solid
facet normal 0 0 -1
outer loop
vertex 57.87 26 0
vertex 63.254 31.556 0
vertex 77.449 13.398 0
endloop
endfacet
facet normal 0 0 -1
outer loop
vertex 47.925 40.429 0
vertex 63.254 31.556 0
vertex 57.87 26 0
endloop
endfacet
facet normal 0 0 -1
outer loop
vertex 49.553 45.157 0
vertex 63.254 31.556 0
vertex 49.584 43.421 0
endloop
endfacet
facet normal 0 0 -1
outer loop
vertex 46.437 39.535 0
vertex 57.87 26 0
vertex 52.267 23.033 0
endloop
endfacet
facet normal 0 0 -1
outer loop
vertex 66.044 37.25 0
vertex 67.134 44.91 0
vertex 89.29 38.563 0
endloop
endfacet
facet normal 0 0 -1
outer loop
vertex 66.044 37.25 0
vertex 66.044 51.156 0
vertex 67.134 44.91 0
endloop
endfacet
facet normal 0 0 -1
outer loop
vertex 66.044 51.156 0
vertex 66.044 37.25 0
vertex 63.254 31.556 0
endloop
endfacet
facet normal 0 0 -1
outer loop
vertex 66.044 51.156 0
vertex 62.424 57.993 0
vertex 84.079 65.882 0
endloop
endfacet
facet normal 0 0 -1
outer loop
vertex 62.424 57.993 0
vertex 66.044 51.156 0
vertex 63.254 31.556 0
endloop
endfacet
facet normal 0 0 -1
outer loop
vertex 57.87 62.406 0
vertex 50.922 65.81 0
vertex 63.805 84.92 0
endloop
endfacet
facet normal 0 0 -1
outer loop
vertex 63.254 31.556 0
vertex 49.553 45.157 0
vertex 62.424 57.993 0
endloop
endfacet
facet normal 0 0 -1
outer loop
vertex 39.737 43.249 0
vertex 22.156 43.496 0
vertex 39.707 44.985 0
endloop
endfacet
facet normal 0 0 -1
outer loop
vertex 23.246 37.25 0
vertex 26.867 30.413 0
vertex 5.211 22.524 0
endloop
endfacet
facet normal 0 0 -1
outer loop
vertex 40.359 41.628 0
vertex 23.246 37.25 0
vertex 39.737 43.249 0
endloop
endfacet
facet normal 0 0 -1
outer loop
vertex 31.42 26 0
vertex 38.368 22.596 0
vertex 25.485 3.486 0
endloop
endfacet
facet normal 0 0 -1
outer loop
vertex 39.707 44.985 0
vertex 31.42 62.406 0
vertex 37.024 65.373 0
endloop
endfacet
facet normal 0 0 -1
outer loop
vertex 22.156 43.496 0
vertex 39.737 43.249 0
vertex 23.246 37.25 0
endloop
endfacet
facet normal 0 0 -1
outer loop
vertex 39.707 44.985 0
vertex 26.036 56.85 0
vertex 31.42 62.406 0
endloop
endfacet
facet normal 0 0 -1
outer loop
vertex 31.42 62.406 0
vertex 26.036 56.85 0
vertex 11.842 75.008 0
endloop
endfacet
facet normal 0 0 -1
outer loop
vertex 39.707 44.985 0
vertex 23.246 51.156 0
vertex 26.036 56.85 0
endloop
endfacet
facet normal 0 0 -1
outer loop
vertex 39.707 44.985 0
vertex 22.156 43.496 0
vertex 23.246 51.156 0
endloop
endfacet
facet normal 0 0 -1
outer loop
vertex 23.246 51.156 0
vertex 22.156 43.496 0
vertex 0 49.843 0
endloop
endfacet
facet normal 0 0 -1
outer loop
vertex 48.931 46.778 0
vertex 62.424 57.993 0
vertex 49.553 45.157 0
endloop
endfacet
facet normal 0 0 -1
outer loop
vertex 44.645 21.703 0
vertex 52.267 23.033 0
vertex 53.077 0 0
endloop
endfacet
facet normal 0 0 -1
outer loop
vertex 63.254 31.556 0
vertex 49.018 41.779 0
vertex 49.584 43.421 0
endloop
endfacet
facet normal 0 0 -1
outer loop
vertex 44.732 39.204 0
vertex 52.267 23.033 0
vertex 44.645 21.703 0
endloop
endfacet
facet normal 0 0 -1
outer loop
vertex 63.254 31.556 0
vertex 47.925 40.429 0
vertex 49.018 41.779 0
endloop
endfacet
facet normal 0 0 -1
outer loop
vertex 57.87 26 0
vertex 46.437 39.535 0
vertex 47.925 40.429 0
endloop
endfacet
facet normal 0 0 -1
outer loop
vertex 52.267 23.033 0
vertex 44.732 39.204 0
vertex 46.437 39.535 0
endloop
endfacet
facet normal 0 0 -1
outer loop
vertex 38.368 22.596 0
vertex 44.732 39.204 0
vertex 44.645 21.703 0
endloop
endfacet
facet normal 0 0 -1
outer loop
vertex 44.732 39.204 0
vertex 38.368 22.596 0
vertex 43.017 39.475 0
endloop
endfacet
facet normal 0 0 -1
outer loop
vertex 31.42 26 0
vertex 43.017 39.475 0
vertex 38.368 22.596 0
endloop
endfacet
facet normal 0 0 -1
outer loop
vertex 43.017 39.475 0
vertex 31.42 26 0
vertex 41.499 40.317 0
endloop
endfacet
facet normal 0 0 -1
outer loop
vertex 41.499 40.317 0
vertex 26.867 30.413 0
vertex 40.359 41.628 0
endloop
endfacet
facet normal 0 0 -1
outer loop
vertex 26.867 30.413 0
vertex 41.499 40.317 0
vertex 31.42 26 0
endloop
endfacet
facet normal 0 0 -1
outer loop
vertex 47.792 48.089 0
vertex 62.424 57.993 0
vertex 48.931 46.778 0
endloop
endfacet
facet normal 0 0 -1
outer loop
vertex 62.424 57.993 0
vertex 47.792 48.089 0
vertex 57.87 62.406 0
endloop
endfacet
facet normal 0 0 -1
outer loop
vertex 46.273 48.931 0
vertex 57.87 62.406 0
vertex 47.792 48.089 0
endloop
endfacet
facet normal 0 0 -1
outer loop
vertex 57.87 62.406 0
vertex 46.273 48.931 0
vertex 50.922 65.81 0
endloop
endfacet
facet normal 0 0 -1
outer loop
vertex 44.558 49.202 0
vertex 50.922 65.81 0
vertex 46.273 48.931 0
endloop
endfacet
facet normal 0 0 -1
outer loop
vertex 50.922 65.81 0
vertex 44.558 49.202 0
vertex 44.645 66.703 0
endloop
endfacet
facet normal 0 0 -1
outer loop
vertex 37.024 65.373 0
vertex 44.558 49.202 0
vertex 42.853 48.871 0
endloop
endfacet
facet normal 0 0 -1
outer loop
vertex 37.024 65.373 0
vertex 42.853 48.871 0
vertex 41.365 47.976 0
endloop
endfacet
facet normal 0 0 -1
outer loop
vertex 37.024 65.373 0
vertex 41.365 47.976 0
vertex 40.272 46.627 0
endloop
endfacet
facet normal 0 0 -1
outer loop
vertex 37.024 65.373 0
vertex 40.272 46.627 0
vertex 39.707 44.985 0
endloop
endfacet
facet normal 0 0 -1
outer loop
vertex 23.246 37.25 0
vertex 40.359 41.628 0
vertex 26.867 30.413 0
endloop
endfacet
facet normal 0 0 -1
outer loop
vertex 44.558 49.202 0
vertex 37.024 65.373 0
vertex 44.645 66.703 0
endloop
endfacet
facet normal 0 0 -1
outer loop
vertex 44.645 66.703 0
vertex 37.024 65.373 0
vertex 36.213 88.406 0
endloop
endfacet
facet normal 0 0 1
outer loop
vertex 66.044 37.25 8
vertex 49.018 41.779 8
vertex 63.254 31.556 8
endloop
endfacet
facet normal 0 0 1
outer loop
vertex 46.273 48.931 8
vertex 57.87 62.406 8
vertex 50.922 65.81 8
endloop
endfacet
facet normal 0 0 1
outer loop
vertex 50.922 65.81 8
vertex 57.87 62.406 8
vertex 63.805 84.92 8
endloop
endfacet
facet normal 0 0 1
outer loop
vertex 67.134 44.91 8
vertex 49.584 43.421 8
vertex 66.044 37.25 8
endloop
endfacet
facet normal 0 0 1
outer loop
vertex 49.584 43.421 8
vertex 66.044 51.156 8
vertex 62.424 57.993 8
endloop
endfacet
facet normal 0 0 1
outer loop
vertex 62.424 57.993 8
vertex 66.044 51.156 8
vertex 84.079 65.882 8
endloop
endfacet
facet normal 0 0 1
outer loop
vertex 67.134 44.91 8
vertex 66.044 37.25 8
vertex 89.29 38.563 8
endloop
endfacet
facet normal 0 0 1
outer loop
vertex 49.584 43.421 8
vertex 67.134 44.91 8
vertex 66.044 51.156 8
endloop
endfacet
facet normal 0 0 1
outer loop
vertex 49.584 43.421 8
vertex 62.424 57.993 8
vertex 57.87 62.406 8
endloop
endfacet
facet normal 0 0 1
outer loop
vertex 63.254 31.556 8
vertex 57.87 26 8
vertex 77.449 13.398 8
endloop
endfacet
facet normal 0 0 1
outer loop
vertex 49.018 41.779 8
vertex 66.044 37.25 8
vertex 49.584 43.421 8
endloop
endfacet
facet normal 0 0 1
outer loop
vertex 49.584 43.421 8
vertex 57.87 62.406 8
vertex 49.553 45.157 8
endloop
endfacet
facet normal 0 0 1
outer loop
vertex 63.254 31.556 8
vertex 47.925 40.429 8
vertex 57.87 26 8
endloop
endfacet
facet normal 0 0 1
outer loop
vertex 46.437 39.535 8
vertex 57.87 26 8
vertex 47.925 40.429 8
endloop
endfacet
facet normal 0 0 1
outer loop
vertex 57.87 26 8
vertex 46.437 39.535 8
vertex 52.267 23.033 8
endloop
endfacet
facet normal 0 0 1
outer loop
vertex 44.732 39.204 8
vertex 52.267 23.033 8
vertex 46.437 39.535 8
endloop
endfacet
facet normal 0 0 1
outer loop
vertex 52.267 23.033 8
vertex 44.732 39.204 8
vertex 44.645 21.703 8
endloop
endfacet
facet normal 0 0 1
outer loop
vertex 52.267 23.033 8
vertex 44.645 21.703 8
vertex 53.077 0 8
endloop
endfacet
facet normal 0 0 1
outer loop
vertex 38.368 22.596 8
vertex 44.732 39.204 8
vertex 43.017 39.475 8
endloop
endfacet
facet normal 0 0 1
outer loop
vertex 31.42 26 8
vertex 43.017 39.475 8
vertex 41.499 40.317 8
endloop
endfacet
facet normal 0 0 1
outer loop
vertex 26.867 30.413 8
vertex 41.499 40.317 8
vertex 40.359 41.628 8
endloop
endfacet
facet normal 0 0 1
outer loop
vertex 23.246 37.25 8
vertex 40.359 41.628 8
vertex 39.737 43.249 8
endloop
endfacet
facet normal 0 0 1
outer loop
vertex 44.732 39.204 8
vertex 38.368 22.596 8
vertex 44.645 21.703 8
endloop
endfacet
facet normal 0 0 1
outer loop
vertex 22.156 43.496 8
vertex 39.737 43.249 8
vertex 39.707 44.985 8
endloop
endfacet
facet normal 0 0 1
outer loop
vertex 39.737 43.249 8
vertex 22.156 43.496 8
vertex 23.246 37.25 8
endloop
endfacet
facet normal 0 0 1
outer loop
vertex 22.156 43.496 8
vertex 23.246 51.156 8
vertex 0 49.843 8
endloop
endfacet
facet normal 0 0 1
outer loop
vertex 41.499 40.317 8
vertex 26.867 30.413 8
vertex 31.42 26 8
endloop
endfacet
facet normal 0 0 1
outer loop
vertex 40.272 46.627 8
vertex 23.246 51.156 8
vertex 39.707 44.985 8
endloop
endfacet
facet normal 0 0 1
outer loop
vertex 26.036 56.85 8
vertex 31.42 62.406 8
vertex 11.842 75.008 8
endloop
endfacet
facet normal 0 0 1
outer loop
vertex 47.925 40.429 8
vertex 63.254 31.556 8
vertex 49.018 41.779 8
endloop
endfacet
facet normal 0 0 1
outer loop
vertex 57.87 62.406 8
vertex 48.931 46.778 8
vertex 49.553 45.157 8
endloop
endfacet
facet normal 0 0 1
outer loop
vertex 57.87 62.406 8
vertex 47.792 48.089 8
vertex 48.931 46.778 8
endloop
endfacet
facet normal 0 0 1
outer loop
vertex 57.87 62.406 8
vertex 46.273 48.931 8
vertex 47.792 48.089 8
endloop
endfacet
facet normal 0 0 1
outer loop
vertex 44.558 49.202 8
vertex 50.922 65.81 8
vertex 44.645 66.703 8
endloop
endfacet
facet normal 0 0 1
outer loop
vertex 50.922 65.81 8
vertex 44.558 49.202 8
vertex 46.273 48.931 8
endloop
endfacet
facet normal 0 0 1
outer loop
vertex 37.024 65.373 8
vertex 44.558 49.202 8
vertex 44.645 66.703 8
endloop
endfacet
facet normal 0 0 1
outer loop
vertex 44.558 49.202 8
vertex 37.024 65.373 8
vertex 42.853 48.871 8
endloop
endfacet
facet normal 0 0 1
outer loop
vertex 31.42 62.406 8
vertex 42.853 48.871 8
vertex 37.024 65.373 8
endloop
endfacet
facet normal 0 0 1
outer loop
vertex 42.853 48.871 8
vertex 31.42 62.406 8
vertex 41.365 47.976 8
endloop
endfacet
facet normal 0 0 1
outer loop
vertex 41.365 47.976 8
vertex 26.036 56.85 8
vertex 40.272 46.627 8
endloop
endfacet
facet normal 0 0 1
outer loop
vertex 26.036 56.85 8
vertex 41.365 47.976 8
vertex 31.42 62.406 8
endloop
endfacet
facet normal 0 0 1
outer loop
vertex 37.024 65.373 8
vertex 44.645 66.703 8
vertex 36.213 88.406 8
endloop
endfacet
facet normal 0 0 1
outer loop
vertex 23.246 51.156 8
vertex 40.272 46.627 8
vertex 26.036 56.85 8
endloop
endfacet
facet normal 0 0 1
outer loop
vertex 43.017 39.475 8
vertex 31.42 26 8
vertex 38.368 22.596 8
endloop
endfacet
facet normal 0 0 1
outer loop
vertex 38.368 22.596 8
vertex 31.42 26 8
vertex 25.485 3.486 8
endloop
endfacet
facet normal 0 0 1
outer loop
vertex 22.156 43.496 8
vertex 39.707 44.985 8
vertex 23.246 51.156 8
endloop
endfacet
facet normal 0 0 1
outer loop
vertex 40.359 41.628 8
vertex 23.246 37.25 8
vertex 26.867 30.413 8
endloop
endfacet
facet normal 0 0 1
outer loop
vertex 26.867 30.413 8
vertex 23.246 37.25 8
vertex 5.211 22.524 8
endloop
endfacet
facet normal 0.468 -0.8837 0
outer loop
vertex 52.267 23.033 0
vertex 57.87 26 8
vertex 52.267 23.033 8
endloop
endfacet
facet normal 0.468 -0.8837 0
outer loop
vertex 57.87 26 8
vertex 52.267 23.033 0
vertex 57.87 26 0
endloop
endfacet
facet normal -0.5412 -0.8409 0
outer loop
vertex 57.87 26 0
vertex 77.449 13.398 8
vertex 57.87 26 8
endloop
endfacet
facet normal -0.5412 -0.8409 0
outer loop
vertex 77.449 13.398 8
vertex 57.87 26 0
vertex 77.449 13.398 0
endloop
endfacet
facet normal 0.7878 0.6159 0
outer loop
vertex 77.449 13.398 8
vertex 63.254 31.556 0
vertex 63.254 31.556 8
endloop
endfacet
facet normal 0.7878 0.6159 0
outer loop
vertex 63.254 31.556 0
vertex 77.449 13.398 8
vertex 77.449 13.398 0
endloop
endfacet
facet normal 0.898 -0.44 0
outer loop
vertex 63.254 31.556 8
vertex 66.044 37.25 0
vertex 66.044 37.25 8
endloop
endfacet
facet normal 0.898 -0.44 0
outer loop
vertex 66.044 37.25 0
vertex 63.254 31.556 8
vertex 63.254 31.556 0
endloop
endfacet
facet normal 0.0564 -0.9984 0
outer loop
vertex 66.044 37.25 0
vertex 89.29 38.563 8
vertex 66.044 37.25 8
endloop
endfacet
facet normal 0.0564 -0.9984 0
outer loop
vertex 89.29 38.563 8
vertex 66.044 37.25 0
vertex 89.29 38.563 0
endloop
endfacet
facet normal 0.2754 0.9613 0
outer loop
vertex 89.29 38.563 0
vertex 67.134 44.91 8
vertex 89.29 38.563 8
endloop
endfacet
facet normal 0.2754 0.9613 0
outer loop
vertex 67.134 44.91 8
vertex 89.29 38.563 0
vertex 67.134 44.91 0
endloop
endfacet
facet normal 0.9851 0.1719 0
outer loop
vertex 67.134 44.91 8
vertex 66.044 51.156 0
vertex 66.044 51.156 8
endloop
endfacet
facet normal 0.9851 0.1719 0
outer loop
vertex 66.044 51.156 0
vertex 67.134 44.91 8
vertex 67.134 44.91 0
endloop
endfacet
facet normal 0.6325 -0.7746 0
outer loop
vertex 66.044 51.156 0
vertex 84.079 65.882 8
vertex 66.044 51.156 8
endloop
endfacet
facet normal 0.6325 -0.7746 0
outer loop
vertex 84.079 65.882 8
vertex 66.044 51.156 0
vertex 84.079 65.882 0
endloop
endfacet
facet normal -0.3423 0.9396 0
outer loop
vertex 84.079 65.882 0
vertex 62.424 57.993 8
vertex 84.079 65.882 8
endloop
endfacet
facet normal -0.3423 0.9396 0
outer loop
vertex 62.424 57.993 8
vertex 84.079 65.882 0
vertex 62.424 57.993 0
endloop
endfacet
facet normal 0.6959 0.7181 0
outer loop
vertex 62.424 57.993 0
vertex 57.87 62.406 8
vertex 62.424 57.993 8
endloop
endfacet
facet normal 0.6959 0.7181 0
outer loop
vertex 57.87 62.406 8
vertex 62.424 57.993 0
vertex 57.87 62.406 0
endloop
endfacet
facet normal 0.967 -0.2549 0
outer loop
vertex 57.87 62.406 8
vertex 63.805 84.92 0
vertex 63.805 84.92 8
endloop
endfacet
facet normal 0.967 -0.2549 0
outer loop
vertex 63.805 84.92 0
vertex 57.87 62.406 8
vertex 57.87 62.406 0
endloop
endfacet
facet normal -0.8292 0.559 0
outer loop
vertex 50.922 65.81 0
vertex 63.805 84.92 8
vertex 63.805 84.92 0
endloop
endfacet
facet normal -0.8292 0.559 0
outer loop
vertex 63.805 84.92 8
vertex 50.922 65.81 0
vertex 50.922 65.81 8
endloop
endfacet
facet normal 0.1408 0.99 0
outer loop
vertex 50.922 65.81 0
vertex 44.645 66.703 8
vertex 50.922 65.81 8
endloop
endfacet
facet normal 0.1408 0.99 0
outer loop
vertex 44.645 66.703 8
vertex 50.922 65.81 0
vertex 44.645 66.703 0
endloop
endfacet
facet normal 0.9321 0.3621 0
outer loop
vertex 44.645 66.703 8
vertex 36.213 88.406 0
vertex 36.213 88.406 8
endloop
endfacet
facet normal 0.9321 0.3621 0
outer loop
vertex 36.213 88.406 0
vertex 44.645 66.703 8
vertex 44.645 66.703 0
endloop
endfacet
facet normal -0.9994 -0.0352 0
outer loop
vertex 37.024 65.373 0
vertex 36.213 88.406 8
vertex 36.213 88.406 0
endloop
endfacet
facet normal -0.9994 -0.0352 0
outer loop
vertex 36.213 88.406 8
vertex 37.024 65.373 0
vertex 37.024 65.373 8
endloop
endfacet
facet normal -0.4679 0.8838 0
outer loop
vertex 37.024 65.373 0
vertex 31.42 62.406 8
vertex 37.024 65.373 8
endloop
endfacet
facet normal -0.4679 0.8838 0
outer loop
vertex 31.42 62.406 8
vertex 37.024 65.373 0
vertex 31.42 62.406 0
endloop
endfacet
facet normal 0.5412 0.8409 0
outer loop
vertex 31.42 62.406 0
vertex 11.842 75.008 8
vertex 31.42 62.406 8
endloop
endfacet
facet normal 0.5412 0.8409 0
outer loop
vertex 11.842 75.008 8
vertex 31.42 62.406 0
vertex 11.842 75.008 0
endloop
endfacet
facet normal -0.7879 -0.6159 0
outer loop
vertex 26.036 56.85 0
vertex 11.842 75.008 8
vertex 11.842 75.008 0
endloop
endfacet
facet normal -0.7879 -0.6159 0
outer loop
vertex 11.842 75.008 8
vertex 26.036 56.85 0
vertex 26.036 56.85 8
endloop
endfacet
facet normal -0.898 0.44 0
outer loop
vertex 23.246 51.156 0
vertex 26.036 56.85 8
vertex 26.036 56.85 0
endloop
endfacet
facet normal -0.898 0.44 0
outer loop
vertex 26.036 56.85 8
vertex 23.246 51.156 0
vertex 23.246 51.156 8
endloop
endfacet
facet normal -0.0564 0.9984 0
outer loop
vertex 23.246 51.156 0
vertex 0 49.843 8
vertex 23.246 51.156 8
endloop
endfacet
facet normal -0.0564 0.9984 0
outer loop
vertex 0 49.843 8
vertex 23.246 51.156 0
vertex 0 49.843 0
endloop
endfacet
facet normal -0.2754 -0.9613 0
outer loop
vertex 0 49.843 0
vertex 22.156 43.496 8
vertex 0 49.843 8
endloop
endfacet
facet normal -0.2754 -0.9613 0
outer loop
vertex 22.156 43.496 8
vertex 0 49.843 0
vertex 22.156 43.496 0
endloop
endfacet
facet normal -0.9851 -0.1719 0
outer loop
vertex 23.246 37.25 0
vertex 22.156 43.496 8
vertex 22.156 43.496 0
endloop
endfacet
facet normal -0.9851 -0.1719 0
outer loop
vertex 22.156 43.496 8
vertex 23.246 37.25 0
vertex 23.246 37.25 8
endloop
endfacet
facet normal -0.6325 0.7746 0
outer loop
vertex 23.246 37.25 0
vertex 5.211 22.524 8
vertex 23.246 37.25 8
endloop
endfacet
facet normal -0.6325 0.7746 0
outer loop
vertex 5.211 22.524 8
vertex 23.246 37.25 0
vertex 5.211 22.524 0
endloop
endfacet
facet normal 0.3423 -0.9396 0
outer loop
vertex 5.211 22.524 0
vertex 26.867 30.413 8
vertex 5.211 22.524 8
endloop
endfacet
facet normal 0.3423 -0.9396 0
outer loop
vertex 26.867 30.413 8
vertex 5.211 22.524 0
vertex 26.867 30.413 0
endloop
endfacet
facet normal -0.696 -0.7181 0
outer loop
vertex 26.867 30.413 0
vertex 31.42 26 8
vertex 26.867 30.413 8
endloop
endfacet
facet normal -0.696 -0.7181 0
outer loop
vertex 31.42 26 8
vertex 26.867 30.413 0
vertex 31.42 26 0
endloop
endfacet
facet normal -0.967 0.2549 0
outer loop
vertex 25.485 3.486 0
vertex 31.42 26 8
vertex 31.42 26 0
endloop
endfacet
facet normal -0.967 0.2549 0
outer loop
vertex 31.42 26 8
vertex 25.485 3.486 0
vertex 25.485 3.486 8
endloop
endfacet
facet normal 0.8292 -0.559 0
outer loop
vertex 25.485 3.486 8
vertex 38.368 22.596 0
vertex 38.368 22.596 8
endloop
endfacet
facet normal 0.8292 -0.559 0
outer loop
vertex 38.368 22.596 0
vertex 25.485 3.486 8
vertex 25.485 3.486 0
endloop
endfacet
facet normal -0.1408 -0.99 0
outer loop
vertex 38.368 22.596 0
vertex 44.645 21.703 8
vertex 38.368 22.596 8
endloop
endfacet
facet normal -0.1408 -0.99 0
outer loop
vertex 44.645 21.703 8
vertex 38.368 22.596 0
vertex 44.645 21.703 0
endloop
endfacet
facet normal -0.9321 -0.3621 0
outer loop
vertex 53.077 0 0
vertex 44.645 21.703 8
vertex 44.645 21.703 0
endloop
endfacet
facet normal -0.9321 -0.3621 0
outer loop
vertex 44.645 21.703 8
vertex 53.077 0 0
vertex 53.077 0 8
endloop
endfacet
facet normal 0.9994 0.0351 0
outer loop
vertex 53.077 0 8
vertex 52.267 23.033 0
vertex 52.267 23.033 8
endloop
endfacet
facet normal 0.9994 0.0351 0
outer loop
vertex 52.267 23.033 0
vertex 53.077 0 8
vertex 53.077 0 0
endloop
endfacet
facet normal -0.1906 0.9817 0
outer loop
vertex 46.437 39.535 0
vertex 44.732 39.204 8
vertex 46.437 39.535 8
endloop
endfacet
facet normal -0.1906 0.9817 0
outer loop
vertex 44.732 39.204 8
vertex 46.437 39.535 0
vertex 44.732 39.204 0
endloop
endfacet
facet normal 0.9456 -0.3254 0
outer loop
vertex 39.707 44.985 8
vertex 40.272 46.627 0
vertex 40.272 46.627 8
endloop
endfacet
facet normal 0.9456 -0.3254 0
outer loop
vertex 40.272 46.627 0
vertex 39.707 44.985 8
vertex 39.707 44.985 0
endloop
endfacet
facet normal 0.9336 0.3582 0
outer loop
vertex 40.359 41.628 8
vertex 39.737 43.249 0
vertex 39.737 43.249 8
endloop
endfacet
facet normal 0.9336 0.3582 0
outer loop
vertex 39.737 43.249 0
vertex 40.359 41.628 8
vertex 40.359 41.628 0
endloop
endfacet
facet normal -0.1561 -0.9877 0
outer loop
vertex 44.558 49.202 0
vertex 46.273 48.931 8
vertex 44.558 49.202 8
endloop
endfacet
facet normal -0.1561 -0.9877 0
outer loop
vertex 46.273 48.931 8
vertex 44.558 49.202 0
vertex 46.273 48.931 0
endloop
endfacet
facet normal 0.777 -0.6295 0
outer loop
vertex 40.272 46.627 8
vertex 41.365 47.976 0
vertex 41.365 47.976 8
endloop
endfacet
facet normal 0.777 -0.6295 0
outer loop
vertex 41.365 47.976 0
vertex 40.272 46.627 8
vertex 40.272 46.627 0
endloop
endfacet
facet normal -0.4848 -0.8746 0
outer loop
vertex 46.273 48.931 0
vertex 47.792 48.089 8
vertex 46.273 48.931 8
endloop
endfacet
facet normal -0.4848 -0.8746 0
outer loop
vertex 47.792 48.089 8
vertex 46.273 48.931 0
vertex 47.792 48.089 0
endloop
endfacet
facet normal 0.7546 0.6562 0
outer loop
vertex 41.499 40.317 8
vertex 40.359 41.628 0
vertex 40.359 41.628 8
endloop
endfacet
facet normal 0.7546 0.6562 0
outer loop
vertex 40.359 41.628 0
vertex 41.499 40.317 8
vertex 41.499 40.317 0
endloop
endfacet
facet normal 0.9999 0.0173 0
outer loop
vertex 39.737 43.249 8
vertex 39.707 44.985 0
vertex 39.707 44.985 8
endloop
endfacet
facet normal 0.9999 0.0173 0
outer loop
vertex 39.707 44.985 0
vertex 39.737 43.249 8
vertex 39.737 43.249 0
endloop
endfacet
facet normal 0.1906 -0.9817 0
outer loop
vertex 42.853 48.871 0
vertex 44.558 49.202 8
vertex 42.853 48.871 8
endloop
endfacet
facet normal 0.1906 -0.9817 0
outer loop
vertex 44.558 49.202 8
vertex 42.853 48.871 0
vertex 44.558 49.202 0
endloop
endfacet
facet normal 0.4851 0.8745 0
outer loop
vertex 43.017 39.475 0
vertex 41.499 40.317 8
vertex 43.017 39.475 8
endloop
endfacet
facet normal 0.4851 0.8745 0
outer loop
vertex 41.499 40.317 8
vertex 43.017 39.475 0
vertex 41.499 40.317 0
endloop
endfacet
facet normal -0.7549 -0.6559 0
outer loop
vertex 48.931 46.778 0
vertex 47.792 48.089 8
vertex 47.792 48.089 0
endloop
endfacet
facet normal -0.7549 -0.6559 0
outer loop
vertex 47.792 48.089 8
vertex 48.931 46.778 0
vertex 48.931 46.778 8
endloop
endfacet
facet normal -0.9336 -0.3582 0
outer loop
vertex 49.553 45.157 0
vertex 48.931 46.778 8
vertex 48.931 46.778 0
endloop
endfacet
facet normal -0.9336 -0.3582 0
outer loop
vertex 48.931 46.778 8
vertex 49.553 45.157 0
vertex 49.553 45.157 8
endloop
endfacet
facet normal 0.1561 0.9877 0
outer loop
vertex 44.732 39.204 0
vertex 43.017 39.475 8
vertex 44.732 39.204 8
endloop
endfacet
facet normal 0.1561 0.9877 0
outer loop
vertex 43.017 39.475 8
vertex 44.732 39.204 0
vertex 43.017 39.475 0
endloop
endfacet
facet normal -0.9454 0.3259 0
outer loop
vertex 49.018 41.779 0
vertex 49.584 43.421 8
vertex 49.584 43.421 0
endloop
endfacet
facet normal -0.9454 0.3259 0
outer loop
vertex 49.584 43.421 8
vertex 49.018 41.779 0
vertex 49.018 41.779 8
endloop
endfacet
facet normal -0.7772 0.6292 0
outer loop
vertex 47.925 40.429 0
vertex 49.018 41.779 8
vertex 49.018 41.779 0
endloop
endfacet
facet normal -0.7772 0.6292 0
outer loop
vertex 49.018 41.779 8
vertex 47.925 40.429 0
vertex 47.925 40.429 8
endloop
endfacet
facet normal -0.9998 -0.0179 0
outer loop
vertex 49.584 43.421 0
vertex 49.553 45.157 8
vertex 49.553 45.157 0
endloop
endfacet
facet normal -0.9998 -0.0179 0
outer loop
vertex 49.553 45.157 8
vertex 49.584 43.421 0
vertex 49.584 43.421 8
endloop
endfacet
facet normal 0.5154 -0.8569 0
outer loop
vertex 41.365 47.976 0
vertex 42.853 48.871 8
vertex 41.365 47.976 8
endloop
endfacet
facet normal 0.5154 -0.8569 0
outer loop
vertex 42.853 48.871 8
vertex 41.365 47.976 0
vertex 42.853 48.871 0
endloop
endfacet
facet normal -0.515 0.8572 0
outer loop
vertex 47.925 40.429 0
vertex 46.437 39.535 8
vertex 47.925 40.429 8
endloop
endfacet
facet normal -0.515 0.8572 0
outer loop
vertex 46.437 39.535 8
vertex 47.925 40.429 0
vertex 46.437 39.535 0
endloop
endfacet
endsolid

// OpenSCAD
$fn = 32;

// ----------------------------------------------------------------------
// Star wheel: 10-point ratchet, R45
// ----------------------------------------------------------------------

// --- parameters (mm) ---
n_points = 10;            // number of points / teeth
r_out = 45;               // tip radius
r_in = 22.5;              // root radius
bore_r = 5;               // centre bore radius
plate_t = 8;              // plate thickness, Z (extrusion height)
bore_d = 10;              // centre bore diameter
fit_tol = 0.02;           // declared fit tolerance (prompt contract)
free_tol = 0.2;           // declared free tolerance (prompt contract)

profile = [[44.645, 66.703], [36.213, 88.406], [37.024, 65.373], [31.42, 62.406], [11.842, 75.008], [26.036, 56.85], [23.246, 51.156], [0, 49.843], [22.156, 43.496], [23.246, 37.25], [5.211, 22.524], [26.867, 30.413], [31.42, 26], [25.485, 3.486], [38.368, 22.596], [44.645, 21.703], [53.077, 0], [52.267, 23.033], [57.87, 26], [77.449, 13.398], [63.254, 31.556], [66.044, 37.25], [89.29, 38.563], [67.134, 44.91], [66.044, 51.156], [84.079, 65.882], [62.424, 57.993], [57.87, 62.406], [63.805, 84.92], [50.922, 65.81]];  // primary outline, 30 points, counter clockwise
void_1 = [[49.553, 45.157], [48.931, 46.778], [47.792, 48.089], [46.273, 48.931], [44.558, 49.202], [42.853, 48.871], [41.365, 47.976], [40.272, 46.627], [39.707, 44.985], [39.737, 43.249], [40.359, 41.628], [41.499, 40.317], [43.017, 39.475], [44.732, 39.204], [46.437, 39.535], [47.925, 40.429], [49.018, 41.779], [49.584, 43.421]];  // centre bore, 18 points

// --- the one profile operation ---
difference() {
  linear_extrude(height = plate_t) polygon(points = profile);
  translate([0, 0, -1])
    linear_extrude(height = plate_t + 2) polygon(points = void_1);
}
